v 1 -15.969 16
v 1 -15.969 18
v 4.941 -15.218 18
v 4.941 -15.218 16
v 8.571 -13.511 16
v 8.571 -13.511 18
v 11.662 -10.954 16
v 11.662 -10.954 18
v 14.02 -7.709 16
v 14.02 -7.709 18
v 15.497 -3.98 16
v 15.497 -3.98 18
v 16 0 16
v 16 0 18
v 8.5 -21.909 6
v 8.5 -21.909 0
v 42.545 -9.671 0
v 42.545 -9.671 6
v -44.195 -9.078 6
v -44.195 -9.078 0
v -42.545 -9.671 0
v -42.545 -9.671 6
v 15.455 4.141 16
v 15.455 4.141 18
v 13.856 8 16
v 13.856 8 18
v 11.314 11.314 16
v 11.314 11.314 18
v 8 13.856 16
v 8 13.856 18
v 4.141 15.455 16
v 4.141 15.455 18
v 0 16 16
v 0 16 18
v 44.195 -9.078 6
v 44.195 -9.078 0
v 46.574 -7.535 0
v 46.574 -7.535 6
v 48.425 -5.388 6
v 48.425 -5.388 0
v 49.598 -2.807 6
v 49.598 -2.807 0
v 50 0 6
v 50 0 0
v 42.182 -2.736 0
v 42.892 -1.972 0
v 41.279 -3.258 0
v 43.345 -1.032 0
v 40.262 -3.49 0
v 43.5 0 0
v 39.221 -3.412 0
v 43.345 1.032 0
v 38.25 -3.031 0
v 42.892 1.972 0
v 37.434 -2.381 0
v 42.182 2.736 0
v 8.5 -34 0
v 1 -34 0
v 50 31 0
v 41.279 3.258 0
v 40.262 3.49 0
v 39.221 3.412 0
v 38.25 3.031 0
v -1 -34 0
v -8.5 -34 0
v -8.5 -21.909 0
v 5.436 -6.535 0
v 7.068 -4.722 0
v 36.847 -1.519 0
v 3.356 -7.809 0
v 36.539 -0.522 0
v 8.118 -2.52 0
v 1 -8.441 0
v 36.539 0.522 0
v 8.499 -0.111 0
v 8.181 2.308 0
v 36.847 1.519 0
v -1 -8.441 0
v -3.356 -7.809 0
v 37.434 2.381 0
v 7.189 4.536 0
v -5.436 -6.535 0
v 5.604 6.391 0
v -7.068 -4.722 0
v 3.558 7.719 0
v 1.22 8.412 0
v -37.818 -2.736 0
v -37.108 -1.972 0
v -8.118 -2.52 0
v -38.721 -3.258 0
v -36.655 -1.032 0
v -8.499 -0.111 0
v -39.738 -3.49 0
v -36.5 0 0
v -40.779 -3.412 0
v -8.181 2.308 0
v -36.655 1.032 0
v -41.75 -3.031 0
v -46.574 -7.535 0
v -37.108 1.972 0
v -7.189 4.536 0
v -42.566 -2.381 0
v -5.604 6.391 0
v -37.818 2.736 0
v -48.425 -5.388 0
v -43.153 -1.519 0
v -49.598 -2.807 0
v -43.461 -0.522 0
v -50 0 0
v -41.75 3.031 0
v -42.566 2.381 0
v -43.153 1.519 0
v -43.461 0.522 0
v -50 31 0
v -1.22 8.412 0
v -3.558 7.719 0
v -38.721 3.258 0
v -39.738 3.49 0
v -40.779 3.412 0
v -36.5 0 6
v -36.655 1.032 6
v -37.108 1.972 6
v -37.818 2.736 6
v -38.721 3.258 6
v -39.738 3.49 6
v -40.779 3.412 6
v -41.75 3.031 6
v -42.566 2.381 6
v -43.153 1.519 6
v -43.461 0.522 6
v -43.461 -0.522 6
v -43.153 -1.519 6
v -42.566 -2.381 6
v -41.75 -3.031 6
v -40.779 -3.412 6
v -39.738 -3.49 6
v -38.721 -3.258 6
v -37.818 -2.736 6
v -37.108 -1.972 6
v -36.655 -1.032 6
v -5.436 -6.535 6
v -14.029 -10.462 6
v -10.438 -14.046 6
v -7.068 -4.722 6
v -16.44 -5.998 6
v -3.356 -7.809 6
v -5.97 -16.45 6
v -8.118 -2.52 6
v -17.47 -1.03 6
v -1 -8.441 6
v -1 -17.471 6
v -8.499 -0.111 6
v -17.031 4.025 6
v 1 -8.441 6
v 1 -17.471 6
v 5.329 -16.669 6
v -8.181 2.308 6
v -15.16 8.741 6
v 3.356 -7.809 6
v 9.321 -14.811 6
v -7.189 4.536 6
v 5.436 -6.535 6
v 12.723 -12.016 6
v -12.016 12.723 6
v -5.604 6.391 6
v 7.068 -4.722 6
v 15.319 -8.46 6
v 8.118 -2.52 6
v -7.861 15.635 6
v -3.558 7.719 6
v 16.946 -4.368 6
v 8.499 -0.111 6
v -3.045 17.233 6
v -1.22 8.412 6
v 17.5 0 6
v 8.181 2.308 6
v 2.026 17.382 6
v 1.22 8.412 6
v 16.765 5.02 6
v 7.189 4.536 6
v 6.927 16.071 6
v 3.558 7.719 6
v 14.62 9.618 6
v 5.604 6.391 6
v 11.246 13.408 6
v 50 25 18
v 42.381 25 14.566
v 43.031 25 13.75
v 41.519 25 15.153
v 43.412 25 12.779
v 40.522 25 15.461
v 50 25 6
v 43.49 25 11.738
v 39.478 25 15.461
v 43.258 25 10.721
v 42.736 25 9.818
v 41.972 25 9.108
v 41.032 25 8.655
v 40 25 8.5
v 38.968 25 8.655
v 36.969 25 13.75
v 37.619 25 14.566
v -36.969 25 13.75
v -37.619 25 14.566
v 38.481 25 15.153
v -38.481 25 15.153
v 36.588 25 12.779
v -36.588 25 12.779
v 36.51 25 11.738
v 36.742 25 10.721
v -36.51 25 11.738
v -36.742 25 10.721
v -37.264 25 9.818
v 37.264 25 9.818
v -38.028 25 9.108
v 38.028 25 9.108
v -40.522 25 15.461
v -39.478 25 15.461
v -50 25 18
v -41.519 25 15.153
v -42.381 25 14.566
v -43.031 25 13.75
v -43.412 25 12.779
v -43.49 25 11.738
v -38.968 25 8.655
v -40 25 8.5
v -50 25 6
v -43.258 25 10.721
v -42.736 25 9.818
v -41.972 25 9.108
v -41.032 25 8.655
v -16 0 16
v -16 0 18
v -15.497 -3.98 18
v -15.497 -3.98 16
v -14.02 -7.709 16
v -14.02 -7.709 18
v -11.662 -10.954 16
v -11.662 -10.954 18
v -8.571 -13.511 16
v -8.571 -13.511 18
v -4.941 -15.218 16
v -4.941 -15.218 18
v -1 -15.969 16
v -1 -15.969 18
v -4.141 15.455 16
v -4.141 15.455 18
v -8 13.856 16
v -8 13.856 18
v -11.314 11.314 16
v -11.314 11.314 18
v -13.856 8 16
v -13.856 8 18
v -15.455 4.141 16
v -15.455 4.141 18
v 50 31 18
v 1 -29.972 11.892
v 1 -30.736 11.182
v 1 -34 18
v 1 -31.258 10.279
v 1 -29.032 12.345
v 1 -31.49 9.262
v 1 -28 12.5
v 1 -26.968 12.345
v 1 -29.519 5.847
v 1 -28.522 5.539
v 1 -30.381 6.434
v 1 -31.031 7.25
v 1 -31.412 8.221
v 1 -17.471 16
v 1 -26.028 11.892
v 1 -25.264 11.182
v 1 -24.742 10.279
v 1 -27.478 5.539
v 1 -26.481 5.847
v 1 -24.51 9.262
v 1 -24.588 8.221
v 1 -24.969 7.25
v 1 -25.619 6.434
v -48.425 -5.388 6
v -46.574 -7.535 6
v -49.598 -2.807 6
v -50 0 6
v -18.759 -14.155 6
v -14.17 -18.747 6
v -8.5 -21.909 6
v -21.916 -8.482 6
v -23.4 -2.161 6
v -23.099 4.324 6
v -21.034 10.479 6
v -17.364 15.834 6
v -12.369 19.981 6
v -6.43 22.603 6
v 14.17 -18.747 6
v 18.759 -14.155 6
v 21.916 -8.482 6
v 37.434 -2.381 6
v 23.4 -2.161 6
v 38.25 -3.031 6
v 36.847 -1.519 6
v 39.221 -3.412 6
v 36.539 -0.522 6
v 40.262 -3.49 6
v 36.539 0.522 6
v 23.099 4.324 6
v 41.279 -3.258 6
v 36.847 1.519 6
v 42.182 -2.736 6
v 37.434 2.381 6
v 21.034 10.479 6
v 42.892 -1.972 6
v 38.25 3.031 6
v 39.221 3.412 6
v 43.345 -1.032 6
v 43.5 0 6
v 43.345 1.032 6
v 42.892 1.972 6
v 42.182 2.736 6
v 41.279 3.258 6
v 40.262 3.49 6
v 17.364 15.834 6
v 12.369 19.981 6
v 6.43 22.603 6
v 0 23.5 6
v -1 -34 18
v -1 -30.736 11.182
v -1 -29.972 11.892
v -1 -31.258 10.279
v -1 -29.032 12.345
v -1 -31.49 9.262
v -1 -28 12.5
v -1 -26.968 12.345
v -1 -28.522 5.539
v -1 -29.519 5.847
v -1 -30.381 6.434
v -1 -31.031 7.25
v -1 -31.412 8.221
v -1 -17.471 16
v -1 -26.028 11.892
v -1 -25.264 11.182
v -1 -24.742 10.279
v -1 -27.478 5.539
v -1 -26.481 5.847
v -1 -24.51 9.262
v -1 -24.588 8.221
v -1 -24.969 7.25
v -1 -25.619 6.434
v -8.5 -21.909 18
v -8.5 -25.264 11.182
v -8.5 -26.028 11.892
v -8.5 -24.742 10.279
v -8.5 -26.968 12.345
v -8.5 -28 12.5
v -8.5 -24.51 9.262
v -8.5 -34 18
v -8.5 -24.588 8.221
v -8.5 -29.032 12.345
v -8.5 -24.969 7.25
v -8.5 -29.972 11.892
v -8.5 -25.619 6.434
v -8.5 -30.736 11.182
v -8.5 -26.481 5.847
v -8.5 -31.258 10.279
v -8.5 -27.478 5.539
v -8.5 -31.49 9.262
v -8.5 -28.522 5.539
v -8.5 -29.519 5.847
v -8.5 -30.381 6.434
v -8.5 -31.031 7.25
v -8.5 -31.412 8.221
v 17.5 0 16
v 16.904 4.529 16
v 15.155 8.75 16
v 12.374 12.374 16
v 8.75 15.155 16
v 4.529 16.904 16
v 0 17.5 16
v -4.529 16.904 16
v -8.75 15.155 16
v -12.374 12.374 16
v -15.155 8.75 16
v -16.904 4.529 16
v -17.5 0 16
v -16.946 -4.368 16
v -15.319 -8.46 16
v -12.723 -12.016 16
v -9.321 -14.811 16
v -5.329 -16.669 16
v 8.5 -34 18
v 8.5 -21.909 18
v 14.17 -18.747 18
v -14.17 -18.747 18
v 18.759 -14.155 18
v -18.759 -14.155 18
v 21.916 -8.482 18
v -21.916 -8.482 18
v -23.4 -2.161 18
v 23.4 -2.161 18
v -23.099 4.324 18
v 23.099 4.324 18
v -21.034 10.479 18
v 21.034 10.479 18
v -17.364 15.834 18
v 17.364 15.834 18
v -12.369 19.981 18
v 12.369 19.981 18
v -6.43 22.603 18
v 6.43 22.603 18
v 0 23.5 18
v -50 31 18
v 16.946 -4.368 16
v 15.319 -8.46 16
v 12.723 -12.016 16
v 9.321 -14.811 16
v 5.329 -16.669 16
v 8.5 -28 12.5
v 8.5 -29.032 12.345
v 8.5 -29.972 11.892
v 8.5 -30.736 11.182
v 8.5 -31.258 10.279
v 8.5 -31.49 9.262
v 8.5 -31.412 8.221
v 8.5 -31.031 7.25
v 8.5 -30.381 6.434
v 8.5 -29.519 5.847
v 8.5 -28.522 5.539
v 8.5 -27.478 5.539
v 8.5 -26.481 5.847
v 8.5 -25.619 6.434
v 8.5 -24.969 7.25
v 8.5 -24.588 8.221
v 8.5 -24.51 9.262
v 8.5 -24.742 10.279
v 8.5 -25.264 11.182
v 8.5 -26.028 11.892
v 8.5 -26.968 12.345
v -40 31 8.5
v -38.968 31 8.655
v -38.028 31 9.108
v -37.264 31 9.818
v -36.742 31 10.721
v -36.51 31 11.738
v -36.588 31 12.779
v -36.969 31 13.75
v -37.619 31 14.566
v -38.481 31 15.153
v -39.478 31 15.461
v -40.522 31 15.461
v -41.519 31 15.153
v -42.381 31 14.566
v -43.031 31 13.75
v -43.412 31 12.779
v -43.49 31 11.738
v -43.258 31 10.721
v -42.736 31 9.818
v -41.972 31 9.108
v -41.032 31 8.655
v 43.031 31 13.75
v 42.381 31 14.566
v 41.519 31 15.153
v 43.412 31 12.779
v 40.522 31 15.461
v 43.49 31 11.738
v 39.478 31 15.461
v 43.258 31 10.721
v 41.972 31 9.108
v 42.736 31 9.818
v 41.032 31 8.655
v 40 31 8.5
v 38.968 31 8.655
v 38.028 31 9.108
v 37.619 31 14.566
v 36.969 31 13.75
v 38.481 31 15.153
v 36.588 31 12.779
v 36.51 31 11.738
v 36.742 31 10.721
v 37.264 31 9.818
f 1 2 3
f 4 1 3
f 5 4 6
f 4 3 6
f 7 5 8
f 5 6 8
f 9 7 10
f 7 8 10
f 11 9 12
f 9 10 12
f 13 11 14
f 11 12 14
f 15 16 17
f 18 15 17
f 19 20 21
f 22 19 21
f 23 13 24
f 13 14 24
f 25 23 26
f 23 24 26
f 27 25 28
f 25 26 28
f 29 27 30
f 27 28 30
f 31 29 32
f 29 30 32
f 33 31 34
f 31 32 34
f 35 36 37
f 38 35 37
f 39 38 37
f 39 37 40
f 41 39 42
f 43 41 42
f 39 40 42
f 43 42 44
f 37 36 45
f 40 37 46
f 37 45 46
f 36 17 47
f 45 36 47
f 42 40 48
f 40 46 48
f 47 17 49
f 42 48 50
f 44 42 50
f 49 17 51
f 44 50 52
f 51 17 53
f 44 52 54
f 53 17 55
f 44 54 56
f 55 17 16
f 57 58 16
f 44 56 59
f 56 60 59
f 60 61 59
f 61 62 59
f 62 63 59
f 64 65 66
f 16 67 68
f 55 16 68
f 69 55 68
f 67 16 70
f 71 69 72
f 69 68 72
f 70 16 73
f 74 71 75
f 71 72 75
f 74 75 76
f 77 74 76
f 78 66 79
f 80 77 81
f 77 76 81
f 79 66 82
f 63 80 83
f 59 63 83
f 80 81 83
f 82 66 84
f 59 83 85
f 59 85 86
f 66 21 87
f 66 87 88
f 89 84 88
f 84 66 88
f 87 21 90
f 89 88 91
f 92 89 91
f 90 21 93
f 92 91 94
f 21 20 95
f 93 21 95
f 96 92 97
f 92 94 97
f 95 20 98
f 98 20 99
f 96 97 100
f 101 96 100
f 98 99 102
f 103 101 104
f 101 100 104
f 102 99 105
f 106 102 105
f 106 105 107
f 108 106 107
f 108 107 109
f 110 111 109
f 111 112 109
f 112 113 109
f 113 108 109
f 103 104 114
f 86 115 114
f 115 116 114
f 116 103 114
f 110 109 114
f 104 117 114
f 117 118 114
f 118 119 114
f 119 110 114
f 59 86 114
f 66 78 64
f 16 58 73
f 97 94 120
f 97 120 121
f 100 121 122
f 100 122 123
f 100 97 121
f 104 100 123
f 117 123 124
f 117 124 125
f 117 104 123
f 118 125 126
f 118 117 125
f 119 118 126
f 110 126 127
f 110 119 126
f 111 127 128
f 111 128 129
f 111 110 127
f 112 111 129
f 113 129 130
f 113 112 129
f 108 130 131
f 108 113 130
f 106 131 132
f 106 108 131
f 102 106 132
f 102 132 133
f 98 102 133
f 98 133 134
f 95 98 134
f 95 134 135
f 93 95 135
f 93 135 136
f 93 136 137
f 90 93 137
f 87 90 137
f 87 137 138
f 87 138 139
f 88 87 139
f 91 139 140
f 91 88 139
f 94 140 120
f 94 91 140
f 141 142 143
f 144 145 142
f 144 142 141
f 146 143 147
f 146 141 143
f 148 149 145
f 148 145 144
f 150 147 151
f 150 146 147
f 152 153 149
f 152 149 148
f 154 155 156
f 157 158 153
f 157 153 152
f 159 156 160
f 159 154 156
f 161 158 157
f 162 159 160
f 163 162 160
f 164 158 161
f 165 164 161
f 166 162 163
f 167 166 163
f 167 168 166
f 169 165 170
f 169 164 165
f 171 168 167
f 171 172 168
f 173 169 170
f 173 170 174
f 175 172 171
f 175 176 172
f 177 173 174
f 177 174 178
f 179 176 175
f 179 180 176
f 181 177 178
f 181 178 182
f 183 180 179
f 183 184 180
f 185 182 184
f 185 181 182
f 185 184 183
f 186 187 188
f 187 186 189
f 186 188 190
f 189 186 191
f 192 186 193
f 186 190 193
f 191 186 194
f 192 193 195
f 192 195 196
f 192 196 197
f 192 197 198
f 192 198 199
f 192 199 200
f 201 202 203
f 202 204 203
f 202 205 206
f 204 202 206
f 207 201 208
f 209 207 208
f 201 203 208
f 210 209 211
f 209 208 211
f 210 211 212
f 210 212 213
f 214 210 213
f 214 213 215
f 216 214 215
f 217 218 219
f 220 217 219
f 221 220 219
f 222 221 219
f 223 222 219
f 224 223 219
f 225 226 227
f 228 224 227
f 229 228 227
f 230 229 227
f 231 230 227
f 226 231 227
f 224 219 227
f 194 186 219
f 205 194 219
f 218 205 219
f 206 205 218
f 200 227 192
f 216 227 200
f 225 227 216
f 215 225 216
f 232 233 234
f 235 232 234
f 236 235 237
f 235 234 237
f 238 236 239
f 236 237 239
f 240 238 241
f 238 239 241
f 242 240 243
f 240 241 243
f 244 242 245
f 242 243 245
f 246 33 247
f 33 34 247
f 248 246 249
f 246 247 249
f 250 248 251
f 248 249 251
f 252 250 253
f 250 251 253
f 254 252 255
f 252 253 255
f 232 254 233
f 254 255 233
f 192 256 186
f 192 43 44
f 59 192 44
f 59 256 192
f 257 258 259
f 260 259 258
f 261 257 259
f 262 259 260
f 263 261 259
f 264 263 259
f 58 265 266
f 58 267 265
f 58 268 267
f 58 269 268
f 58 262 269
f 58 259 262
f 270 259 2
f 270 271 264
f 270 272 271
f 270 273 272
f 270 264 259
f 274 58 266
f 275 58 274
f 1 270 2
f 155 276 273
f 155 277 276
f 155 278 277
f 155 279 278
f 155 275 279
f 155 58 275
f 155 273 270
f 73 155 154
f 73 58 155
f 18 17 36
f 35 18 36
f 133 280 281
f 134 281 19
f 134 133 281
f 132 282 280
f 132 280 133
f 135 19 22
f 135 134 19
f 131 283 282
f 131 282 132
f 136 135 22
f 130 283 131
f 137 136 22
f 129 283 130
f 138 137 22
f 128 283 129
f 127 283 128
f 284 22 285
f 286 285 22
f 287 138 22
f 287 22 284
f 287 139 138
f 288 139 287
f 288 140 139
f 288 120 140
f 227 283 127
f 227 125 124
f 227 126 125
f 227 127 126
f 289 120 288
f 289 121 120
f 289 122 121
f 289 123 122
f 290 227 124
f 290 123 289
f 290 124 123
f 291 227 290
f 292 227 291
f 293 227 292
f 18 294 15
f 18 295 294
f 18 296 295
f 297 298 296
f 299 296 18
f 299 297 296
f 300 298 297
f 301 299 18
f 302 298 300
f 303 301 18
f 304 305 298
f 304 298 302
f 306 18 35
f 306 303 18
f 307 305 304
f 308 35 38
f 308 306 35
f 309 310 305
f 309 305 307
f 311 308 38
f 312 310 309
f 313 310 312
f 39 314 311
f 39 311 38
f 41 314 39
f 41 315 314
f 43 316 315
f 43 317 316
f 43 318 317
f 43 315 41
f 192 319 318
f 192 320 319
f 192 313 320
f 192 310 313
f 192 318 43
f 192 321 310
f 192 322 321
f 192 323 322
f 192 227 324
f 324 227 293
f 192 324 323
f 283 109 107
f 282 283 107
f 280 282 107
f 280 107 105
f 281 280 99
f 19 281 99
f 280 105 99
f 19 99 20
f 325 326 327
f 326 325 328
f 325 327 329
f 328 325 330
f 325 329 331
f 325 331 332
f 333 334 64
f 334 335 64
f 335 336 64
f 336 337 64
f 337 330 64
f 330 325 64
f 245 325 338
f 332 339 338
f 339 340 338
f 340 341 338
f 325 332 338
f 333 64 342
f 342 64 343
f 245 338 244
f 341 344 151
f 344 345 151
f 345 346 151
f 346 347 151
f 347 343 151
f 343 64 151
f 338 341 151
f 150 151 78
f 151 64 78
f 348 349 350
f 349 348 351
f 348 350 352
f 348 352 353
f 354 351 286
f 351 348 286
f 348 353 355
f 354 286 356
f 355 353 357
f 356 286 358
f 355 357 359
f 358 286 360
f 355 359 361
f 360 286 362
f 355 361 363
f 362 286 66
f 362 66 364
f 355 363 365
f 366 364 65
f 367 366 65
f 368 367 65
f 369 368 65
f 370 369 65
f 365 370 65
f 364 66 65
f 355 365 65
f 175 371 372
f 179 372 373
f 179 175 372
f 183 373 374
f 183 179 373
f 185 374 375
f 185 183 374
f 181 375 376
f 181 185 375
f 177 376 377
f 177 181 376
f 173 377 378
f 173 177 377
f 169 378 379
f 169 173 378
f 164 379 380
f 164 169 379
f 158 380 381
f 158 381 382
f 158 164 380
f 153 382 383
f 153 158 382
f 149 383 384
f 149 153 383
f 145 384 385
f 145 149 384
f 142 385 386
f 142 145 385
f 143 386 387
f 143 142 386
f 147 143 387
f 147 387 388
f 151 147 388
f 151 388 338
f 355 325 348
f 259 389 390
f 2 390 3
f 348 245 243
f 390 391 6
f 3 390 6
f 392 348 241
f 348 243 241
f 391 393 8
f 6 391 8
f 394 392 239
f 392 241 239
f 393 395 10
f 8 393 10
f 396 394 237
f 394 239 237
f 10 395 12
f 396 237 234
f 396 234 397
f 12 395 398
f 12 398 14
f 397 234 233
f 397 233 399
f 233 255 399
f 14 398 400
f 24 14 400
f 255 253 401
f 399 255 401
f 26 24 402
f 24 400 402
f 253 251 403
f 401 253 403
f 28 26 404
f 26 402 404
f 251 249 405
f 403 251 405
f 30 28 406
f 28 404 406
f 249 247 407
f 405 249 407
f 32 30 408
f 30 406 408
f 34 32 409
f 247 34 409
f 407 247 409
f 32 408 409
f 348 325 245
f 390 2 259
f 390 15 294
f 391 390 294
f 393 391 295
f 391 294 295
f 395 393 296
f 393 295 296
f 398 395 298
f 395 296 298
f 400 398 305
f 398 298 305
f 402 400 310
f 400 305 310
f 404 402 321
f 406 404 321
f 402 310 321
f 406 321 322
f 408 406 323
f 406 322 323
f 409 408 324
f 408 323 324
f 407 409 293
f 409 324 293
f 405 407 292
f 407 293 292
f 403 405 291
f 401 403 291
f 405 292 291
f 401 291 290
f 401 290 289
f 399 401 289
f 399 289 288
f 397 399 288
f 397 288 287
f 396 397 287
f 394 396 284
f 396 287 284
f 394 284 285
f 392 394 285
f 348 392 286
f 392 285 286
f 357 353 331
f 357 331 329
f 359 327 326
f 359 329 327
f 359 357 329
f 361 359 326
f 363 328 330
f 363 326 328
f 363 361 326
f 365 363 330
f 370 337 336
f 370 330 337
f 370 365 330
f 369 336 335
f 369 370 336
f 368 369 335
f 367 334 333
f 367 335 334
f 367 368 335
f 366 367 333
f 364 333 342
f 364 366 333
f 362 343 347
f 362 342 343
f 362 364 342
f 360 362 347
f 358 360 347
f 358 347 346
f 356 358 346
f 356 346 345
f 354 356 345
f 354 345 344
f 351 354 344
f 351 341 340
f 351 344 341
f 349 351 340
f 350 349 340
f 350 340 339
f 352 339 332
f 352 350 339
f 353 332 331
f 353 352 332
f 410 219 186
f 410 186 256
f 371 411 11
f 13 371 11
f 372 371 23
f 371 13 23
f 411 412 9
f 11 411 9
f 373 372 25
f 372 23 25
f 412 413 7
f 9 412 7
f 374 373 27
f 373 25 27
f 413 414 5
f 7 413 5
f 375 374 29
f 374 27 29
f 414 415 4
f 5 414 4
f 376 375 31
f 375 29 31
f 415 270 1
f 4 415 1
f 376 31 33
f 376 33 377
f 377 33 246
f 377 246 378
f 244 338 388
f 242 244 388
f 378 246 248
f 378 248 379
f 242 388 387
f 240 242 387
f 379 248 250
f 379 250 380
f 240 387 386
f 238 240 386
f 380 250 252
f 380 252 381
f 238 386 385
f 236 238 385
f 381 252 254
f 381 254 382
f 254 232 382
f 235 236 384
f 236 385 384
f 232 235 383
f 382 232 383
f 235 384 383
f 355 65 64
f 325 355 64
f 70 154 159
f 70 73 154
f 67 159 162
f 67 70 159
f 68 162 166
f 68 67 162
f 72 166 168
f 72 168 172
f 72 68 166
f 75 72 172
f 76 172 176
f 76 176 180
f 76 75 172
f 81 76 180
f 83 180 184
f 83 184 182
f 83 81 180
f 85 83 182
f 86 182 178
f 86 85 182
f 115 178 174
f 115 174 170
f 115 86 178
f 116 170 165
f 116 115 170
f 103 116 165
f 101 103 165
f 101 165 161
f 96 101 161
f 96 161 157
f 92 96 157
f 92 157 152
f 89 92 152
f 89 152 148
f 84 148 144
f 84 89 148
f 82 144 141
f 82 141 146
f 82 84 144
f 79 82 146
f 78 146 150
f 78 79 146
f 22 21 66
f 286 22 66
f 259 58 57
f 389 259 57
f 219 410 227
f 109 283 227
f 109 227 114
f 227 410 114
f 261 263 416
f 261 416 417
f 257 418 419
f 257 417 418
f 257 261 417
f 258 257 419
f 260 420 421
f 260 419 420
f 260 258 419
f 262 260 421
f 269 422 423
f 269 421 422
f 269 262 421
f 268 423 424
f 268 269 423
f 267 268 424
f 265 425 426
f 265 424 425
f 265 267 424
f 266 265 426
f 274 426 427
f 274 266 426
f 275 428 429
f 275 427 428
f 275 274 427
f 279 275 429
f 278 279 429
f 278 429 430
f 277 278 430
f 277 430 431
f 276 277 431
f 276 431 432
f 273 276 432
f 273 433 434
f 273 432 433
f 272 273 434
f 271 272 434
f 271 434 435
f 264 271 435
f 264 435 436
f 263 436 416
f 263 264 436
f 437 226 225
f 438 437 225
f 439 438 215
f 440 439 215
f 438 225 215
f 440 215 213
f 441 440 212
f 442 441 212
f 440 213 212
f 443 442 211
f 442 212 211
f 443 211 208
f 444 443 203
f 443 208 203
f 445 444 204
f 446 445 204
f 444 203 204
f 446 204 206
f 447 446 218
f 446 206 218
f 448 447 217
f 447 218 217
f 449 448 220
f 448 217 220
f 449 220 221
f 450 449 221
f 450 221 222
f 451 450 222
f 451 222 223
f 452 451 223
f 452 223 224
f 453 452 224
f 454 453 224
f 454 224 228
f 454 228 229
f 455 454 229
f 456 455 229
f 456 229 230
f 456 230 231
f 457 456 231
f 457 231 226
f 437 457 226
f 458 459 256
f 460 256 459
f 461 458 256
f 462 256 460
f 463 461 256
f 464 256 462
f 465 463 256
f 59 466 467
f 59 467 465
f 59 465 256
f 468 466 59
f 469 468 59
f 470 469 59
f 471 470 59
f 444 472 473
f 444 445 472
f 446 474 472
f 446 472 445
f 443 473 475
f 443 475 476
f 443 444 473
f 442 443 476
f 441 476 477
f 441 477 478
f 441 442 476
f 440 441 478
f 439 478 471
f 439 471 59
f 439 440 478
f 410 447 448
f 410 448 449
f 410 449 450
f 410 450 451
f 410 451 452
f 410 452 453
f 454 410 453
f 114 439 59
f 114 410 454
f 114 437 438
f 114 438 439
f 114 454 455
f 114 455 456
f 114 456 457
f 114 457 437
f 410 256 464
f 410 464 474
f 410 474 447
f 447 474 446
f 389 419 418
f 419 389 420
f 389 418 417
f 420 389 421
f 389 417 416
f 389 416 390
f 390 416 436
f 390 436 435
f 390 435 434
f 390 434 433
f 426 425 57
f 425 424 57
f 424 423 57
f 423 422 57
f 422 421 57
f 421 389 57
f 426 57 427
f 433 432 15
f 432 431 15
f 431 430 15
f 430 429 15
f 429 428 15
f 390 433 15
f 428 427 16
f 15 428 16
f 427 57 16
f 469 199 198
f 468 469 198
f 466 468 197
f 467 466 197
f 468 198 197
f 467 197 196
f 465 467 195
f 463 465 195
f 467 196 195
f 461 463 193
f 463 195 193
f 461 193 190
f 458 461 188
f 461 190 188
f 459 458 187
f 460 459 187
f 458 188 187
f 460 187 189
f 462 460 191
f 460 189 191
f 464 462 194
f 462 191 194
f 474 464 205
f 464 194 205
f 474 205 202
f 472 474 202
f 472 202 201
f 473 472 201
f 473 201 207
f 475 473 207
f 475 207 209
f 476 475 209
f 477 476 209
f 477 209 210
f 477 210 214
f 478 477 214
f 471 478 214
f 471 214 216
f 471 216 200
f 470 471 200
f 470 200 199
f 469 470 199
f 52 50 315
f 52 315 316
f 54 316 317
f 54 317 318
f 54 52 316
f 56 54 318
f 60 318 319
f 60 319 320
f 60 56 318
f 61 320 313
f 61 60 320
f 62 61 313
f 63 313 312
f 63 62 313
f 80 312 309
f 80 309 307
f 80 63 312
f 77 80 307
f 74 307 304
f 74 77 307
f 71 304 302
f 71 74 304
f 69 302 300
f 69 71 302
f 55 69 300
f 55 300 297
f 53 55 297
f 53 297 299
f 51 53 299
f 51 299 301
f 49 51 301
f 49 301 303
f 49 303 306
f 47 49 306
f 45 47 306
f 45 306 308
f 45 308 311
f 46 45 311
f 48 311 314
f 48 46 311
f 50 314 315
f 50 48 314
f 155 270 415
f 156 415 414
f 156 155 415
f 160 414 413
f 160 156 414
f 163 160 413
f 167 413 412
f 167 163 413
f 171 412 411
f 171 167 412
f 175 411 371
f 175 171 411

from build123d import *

# Parameters (mm, degrees)
SKETCH1_R                = 3.5
SKETCH1_R_2              = 8.5
BOSS_EXTRUDE1_DEPTH      = 6
SKETCH2_R                = 17.5
BOSS_EXTRUDE2_DEPTH      = 12
SKETCH4_W                = 1.5
SKETCH4_H                = 2
CUT_EXTRUDE1_DEPTH       = 64.087241182
CUT_EXTRUDE1_DEPTH_BACK  = 64.087241182
SKETCH5_R                = 3.5
BOSS_EXTRUDE6_DEPTH      = 50
BOSS_EXTRUDE6_DEPTH_BACK = 50
SKETCH9_W                = 18
SKETCH9_H                = 6
CUT_EXTRUDE10_DEPTH      = 64.087241182
CUT_EXTRUDE10_DEPTH_BACK = 64.087241182
SKETCH10_W               = 2
SKETCH10_H               = 34
SKETCH11_R               = 3.5
CUT_EXTRUDE11_DEPTH      = 80.404030124


with BuildPart() as part:
    # Sketch1 → Boss-Extrude1 (new body)
    with BuildSketch(Plane.XY):
        with BuildLine():
            Line((-42.544589072, -9.670835871), (-8.5, -21.9089023))
            Line((-8.5, -21.9089023), (-8.5, -34))
            Line((-8.5, -34), (8.5, -34))
            Line((8.5, -34), (8.5, -21.9089023))
            Line((8.5, -21.9089023), (42.544589072, -9.670835871))
            Line((42.544589072, -9.670835871), (44.194936835, -9.07758255))
            ThreePointArc((44.194936835, -9.07758255), (48.424647422, -5.38751481), (50, 0))
            Line((50, 0), (50, 25))
            Line((50, 25), (-50, 25))
            Line((-50, 25), (-50, 0))
            ThreePointArc((-50, 0), (-48.424647422, -5.38751481), (-44.194936835, -9.07758255))
            Line((-44.194936835, -9.07758255), (-42.544589072, -9.670835871))
        make_face()
        with Locations((-40, 0)):
            Circle(SKETCH1_R, mode=Mode.SUBTRACT)
        Circle(SKETCH1_R_2, mode=Mode.SUBTRACT)
        with Locations((40, 0)):
            Circle(SKETCH1_R, mode=Mode.SUBTRACT)
    extrude(amount=BOSS_EXTRUDE1_DEPTH)

    # Sketch2 → Boss-Extrude2 (add)
    with BuildSketch(Plane.XY.offset(6)):
        with BuildLine():
            Line((-8.5, -34), (8.5, -34))
            Line((8.5, -34), (8.5, -21.9089023))
            ThreePointArc((8.5, -21.9089023), (0, 23.5), (-8.5, -21.9089023))
            Line((-8.5, -21.9089023), (-8.5, -34))
        make_face()
        Circle(SKETCH2_R, mode=Mode.SUBTRACT)
    extrude(amount=BOSS_EXTRUDE2_DEPTH)

    # Sweep1: sweep along a curve in space
    with BuildLine() as sweep1_path:
        ThreePointArc((17.5, 0, 18), (12.374368671, 12.374368671, 18), (0, 17.5, 18))
        ThreePointArc((0, 17.5, 18), (-12.374368671, 12.374368671, 18), (-17.5, 0, 18))
        ThreePointArc((-17.5, 0, 18), (-12.374368671, -12.374368671, 18), (0, -17.5, 18))
        ThreePointArc((0, -17.5, 18), (12.374368671, -12.374368671, 18), (17.5, 0, 18))
    # Sketch4 → Sweep1 (sweep)
    with BuildSketch(Plane(origin=(0, 0, 0), x_dir=(1, 0, 0), z_dir=(0, 1, 0))):
        with Locations((16.75, -17)):
            Rectangle(SKETCH4_W, SKETCH4_H)
    sweep(path=sweep1_path.line)

    # Sketch5 → Cut-Extrude1 (cut, two sides: drawn at the far end of the back side and taken through both)
    with BuildSketch(Plane(origin=(0, 0, 0), x_dir=(0, 0, -1), z_dir=(1, 0, 0)).offset(-CUT_EXTRUDE1_DEPTH_BACK)):
        with Locations(Location((-9, -28, 0), (0, 0, 180))):
            Circle(SKETCH5_R)
    extrude(amount=CUT_EXTRUDE1_DEPTH + CUT_EXTRUDE1_DEPTH_BACK, mode=Mode.SUBTRACT)

    # Sketch9 → Boss-Extrude6 (add, two sides: drawn at the far end of the back side and taken through both)
    with BuildSketch(Plane(origin=(0, 0, 0), x_dir=(0, 0, -1), z_dir=(1, 0, 0)).offset(-BOSS_EXTRUDE6_DEPTH_BACK)):
        with Locations((-9, 28)):
            Rectangle(SKETCH9_W, SKETCH9_H)
    extrude(amount=BOSS_EXTRUDE6_DEPTH + BOSS_EXTRUDE6_DEPTH_BACK)

    # Sketch10 → Cut-Extrude10 (cut, two sides: drawn at the far end of the back side and taken through both)
    with BuildSketch(Plane.XY.offset(-CUT_EXTRUDE10_DEPTH_BACK)):
        with Locations((0, -17)):
            Rectangle(SKETCH10_W, SKETCH10_H)
    extrude(amount=CUT_EXTRUDE10_DEPTH + CUT_EXTRUDE10_DEPTH_BACK, mode=Mode.SUBTRACT)

    # Sketch11 → Cut-Extrude11 (cut, through all)
    with BuildSketch(Plane.XZ.offset(-25)):
        with Locations(Location((-40, 12, 0), (0, 0, 270))):
            Circle(SKETCH11_R)
        with Locations(Location((40, 12, 0), (0, 0, 270))):
            Circle(SKETCH11_R)
    extrude(amount=-CUT_EXTRUDE11_DEPTH, mode=Mode.SUBTRACT)


solid = part.part
